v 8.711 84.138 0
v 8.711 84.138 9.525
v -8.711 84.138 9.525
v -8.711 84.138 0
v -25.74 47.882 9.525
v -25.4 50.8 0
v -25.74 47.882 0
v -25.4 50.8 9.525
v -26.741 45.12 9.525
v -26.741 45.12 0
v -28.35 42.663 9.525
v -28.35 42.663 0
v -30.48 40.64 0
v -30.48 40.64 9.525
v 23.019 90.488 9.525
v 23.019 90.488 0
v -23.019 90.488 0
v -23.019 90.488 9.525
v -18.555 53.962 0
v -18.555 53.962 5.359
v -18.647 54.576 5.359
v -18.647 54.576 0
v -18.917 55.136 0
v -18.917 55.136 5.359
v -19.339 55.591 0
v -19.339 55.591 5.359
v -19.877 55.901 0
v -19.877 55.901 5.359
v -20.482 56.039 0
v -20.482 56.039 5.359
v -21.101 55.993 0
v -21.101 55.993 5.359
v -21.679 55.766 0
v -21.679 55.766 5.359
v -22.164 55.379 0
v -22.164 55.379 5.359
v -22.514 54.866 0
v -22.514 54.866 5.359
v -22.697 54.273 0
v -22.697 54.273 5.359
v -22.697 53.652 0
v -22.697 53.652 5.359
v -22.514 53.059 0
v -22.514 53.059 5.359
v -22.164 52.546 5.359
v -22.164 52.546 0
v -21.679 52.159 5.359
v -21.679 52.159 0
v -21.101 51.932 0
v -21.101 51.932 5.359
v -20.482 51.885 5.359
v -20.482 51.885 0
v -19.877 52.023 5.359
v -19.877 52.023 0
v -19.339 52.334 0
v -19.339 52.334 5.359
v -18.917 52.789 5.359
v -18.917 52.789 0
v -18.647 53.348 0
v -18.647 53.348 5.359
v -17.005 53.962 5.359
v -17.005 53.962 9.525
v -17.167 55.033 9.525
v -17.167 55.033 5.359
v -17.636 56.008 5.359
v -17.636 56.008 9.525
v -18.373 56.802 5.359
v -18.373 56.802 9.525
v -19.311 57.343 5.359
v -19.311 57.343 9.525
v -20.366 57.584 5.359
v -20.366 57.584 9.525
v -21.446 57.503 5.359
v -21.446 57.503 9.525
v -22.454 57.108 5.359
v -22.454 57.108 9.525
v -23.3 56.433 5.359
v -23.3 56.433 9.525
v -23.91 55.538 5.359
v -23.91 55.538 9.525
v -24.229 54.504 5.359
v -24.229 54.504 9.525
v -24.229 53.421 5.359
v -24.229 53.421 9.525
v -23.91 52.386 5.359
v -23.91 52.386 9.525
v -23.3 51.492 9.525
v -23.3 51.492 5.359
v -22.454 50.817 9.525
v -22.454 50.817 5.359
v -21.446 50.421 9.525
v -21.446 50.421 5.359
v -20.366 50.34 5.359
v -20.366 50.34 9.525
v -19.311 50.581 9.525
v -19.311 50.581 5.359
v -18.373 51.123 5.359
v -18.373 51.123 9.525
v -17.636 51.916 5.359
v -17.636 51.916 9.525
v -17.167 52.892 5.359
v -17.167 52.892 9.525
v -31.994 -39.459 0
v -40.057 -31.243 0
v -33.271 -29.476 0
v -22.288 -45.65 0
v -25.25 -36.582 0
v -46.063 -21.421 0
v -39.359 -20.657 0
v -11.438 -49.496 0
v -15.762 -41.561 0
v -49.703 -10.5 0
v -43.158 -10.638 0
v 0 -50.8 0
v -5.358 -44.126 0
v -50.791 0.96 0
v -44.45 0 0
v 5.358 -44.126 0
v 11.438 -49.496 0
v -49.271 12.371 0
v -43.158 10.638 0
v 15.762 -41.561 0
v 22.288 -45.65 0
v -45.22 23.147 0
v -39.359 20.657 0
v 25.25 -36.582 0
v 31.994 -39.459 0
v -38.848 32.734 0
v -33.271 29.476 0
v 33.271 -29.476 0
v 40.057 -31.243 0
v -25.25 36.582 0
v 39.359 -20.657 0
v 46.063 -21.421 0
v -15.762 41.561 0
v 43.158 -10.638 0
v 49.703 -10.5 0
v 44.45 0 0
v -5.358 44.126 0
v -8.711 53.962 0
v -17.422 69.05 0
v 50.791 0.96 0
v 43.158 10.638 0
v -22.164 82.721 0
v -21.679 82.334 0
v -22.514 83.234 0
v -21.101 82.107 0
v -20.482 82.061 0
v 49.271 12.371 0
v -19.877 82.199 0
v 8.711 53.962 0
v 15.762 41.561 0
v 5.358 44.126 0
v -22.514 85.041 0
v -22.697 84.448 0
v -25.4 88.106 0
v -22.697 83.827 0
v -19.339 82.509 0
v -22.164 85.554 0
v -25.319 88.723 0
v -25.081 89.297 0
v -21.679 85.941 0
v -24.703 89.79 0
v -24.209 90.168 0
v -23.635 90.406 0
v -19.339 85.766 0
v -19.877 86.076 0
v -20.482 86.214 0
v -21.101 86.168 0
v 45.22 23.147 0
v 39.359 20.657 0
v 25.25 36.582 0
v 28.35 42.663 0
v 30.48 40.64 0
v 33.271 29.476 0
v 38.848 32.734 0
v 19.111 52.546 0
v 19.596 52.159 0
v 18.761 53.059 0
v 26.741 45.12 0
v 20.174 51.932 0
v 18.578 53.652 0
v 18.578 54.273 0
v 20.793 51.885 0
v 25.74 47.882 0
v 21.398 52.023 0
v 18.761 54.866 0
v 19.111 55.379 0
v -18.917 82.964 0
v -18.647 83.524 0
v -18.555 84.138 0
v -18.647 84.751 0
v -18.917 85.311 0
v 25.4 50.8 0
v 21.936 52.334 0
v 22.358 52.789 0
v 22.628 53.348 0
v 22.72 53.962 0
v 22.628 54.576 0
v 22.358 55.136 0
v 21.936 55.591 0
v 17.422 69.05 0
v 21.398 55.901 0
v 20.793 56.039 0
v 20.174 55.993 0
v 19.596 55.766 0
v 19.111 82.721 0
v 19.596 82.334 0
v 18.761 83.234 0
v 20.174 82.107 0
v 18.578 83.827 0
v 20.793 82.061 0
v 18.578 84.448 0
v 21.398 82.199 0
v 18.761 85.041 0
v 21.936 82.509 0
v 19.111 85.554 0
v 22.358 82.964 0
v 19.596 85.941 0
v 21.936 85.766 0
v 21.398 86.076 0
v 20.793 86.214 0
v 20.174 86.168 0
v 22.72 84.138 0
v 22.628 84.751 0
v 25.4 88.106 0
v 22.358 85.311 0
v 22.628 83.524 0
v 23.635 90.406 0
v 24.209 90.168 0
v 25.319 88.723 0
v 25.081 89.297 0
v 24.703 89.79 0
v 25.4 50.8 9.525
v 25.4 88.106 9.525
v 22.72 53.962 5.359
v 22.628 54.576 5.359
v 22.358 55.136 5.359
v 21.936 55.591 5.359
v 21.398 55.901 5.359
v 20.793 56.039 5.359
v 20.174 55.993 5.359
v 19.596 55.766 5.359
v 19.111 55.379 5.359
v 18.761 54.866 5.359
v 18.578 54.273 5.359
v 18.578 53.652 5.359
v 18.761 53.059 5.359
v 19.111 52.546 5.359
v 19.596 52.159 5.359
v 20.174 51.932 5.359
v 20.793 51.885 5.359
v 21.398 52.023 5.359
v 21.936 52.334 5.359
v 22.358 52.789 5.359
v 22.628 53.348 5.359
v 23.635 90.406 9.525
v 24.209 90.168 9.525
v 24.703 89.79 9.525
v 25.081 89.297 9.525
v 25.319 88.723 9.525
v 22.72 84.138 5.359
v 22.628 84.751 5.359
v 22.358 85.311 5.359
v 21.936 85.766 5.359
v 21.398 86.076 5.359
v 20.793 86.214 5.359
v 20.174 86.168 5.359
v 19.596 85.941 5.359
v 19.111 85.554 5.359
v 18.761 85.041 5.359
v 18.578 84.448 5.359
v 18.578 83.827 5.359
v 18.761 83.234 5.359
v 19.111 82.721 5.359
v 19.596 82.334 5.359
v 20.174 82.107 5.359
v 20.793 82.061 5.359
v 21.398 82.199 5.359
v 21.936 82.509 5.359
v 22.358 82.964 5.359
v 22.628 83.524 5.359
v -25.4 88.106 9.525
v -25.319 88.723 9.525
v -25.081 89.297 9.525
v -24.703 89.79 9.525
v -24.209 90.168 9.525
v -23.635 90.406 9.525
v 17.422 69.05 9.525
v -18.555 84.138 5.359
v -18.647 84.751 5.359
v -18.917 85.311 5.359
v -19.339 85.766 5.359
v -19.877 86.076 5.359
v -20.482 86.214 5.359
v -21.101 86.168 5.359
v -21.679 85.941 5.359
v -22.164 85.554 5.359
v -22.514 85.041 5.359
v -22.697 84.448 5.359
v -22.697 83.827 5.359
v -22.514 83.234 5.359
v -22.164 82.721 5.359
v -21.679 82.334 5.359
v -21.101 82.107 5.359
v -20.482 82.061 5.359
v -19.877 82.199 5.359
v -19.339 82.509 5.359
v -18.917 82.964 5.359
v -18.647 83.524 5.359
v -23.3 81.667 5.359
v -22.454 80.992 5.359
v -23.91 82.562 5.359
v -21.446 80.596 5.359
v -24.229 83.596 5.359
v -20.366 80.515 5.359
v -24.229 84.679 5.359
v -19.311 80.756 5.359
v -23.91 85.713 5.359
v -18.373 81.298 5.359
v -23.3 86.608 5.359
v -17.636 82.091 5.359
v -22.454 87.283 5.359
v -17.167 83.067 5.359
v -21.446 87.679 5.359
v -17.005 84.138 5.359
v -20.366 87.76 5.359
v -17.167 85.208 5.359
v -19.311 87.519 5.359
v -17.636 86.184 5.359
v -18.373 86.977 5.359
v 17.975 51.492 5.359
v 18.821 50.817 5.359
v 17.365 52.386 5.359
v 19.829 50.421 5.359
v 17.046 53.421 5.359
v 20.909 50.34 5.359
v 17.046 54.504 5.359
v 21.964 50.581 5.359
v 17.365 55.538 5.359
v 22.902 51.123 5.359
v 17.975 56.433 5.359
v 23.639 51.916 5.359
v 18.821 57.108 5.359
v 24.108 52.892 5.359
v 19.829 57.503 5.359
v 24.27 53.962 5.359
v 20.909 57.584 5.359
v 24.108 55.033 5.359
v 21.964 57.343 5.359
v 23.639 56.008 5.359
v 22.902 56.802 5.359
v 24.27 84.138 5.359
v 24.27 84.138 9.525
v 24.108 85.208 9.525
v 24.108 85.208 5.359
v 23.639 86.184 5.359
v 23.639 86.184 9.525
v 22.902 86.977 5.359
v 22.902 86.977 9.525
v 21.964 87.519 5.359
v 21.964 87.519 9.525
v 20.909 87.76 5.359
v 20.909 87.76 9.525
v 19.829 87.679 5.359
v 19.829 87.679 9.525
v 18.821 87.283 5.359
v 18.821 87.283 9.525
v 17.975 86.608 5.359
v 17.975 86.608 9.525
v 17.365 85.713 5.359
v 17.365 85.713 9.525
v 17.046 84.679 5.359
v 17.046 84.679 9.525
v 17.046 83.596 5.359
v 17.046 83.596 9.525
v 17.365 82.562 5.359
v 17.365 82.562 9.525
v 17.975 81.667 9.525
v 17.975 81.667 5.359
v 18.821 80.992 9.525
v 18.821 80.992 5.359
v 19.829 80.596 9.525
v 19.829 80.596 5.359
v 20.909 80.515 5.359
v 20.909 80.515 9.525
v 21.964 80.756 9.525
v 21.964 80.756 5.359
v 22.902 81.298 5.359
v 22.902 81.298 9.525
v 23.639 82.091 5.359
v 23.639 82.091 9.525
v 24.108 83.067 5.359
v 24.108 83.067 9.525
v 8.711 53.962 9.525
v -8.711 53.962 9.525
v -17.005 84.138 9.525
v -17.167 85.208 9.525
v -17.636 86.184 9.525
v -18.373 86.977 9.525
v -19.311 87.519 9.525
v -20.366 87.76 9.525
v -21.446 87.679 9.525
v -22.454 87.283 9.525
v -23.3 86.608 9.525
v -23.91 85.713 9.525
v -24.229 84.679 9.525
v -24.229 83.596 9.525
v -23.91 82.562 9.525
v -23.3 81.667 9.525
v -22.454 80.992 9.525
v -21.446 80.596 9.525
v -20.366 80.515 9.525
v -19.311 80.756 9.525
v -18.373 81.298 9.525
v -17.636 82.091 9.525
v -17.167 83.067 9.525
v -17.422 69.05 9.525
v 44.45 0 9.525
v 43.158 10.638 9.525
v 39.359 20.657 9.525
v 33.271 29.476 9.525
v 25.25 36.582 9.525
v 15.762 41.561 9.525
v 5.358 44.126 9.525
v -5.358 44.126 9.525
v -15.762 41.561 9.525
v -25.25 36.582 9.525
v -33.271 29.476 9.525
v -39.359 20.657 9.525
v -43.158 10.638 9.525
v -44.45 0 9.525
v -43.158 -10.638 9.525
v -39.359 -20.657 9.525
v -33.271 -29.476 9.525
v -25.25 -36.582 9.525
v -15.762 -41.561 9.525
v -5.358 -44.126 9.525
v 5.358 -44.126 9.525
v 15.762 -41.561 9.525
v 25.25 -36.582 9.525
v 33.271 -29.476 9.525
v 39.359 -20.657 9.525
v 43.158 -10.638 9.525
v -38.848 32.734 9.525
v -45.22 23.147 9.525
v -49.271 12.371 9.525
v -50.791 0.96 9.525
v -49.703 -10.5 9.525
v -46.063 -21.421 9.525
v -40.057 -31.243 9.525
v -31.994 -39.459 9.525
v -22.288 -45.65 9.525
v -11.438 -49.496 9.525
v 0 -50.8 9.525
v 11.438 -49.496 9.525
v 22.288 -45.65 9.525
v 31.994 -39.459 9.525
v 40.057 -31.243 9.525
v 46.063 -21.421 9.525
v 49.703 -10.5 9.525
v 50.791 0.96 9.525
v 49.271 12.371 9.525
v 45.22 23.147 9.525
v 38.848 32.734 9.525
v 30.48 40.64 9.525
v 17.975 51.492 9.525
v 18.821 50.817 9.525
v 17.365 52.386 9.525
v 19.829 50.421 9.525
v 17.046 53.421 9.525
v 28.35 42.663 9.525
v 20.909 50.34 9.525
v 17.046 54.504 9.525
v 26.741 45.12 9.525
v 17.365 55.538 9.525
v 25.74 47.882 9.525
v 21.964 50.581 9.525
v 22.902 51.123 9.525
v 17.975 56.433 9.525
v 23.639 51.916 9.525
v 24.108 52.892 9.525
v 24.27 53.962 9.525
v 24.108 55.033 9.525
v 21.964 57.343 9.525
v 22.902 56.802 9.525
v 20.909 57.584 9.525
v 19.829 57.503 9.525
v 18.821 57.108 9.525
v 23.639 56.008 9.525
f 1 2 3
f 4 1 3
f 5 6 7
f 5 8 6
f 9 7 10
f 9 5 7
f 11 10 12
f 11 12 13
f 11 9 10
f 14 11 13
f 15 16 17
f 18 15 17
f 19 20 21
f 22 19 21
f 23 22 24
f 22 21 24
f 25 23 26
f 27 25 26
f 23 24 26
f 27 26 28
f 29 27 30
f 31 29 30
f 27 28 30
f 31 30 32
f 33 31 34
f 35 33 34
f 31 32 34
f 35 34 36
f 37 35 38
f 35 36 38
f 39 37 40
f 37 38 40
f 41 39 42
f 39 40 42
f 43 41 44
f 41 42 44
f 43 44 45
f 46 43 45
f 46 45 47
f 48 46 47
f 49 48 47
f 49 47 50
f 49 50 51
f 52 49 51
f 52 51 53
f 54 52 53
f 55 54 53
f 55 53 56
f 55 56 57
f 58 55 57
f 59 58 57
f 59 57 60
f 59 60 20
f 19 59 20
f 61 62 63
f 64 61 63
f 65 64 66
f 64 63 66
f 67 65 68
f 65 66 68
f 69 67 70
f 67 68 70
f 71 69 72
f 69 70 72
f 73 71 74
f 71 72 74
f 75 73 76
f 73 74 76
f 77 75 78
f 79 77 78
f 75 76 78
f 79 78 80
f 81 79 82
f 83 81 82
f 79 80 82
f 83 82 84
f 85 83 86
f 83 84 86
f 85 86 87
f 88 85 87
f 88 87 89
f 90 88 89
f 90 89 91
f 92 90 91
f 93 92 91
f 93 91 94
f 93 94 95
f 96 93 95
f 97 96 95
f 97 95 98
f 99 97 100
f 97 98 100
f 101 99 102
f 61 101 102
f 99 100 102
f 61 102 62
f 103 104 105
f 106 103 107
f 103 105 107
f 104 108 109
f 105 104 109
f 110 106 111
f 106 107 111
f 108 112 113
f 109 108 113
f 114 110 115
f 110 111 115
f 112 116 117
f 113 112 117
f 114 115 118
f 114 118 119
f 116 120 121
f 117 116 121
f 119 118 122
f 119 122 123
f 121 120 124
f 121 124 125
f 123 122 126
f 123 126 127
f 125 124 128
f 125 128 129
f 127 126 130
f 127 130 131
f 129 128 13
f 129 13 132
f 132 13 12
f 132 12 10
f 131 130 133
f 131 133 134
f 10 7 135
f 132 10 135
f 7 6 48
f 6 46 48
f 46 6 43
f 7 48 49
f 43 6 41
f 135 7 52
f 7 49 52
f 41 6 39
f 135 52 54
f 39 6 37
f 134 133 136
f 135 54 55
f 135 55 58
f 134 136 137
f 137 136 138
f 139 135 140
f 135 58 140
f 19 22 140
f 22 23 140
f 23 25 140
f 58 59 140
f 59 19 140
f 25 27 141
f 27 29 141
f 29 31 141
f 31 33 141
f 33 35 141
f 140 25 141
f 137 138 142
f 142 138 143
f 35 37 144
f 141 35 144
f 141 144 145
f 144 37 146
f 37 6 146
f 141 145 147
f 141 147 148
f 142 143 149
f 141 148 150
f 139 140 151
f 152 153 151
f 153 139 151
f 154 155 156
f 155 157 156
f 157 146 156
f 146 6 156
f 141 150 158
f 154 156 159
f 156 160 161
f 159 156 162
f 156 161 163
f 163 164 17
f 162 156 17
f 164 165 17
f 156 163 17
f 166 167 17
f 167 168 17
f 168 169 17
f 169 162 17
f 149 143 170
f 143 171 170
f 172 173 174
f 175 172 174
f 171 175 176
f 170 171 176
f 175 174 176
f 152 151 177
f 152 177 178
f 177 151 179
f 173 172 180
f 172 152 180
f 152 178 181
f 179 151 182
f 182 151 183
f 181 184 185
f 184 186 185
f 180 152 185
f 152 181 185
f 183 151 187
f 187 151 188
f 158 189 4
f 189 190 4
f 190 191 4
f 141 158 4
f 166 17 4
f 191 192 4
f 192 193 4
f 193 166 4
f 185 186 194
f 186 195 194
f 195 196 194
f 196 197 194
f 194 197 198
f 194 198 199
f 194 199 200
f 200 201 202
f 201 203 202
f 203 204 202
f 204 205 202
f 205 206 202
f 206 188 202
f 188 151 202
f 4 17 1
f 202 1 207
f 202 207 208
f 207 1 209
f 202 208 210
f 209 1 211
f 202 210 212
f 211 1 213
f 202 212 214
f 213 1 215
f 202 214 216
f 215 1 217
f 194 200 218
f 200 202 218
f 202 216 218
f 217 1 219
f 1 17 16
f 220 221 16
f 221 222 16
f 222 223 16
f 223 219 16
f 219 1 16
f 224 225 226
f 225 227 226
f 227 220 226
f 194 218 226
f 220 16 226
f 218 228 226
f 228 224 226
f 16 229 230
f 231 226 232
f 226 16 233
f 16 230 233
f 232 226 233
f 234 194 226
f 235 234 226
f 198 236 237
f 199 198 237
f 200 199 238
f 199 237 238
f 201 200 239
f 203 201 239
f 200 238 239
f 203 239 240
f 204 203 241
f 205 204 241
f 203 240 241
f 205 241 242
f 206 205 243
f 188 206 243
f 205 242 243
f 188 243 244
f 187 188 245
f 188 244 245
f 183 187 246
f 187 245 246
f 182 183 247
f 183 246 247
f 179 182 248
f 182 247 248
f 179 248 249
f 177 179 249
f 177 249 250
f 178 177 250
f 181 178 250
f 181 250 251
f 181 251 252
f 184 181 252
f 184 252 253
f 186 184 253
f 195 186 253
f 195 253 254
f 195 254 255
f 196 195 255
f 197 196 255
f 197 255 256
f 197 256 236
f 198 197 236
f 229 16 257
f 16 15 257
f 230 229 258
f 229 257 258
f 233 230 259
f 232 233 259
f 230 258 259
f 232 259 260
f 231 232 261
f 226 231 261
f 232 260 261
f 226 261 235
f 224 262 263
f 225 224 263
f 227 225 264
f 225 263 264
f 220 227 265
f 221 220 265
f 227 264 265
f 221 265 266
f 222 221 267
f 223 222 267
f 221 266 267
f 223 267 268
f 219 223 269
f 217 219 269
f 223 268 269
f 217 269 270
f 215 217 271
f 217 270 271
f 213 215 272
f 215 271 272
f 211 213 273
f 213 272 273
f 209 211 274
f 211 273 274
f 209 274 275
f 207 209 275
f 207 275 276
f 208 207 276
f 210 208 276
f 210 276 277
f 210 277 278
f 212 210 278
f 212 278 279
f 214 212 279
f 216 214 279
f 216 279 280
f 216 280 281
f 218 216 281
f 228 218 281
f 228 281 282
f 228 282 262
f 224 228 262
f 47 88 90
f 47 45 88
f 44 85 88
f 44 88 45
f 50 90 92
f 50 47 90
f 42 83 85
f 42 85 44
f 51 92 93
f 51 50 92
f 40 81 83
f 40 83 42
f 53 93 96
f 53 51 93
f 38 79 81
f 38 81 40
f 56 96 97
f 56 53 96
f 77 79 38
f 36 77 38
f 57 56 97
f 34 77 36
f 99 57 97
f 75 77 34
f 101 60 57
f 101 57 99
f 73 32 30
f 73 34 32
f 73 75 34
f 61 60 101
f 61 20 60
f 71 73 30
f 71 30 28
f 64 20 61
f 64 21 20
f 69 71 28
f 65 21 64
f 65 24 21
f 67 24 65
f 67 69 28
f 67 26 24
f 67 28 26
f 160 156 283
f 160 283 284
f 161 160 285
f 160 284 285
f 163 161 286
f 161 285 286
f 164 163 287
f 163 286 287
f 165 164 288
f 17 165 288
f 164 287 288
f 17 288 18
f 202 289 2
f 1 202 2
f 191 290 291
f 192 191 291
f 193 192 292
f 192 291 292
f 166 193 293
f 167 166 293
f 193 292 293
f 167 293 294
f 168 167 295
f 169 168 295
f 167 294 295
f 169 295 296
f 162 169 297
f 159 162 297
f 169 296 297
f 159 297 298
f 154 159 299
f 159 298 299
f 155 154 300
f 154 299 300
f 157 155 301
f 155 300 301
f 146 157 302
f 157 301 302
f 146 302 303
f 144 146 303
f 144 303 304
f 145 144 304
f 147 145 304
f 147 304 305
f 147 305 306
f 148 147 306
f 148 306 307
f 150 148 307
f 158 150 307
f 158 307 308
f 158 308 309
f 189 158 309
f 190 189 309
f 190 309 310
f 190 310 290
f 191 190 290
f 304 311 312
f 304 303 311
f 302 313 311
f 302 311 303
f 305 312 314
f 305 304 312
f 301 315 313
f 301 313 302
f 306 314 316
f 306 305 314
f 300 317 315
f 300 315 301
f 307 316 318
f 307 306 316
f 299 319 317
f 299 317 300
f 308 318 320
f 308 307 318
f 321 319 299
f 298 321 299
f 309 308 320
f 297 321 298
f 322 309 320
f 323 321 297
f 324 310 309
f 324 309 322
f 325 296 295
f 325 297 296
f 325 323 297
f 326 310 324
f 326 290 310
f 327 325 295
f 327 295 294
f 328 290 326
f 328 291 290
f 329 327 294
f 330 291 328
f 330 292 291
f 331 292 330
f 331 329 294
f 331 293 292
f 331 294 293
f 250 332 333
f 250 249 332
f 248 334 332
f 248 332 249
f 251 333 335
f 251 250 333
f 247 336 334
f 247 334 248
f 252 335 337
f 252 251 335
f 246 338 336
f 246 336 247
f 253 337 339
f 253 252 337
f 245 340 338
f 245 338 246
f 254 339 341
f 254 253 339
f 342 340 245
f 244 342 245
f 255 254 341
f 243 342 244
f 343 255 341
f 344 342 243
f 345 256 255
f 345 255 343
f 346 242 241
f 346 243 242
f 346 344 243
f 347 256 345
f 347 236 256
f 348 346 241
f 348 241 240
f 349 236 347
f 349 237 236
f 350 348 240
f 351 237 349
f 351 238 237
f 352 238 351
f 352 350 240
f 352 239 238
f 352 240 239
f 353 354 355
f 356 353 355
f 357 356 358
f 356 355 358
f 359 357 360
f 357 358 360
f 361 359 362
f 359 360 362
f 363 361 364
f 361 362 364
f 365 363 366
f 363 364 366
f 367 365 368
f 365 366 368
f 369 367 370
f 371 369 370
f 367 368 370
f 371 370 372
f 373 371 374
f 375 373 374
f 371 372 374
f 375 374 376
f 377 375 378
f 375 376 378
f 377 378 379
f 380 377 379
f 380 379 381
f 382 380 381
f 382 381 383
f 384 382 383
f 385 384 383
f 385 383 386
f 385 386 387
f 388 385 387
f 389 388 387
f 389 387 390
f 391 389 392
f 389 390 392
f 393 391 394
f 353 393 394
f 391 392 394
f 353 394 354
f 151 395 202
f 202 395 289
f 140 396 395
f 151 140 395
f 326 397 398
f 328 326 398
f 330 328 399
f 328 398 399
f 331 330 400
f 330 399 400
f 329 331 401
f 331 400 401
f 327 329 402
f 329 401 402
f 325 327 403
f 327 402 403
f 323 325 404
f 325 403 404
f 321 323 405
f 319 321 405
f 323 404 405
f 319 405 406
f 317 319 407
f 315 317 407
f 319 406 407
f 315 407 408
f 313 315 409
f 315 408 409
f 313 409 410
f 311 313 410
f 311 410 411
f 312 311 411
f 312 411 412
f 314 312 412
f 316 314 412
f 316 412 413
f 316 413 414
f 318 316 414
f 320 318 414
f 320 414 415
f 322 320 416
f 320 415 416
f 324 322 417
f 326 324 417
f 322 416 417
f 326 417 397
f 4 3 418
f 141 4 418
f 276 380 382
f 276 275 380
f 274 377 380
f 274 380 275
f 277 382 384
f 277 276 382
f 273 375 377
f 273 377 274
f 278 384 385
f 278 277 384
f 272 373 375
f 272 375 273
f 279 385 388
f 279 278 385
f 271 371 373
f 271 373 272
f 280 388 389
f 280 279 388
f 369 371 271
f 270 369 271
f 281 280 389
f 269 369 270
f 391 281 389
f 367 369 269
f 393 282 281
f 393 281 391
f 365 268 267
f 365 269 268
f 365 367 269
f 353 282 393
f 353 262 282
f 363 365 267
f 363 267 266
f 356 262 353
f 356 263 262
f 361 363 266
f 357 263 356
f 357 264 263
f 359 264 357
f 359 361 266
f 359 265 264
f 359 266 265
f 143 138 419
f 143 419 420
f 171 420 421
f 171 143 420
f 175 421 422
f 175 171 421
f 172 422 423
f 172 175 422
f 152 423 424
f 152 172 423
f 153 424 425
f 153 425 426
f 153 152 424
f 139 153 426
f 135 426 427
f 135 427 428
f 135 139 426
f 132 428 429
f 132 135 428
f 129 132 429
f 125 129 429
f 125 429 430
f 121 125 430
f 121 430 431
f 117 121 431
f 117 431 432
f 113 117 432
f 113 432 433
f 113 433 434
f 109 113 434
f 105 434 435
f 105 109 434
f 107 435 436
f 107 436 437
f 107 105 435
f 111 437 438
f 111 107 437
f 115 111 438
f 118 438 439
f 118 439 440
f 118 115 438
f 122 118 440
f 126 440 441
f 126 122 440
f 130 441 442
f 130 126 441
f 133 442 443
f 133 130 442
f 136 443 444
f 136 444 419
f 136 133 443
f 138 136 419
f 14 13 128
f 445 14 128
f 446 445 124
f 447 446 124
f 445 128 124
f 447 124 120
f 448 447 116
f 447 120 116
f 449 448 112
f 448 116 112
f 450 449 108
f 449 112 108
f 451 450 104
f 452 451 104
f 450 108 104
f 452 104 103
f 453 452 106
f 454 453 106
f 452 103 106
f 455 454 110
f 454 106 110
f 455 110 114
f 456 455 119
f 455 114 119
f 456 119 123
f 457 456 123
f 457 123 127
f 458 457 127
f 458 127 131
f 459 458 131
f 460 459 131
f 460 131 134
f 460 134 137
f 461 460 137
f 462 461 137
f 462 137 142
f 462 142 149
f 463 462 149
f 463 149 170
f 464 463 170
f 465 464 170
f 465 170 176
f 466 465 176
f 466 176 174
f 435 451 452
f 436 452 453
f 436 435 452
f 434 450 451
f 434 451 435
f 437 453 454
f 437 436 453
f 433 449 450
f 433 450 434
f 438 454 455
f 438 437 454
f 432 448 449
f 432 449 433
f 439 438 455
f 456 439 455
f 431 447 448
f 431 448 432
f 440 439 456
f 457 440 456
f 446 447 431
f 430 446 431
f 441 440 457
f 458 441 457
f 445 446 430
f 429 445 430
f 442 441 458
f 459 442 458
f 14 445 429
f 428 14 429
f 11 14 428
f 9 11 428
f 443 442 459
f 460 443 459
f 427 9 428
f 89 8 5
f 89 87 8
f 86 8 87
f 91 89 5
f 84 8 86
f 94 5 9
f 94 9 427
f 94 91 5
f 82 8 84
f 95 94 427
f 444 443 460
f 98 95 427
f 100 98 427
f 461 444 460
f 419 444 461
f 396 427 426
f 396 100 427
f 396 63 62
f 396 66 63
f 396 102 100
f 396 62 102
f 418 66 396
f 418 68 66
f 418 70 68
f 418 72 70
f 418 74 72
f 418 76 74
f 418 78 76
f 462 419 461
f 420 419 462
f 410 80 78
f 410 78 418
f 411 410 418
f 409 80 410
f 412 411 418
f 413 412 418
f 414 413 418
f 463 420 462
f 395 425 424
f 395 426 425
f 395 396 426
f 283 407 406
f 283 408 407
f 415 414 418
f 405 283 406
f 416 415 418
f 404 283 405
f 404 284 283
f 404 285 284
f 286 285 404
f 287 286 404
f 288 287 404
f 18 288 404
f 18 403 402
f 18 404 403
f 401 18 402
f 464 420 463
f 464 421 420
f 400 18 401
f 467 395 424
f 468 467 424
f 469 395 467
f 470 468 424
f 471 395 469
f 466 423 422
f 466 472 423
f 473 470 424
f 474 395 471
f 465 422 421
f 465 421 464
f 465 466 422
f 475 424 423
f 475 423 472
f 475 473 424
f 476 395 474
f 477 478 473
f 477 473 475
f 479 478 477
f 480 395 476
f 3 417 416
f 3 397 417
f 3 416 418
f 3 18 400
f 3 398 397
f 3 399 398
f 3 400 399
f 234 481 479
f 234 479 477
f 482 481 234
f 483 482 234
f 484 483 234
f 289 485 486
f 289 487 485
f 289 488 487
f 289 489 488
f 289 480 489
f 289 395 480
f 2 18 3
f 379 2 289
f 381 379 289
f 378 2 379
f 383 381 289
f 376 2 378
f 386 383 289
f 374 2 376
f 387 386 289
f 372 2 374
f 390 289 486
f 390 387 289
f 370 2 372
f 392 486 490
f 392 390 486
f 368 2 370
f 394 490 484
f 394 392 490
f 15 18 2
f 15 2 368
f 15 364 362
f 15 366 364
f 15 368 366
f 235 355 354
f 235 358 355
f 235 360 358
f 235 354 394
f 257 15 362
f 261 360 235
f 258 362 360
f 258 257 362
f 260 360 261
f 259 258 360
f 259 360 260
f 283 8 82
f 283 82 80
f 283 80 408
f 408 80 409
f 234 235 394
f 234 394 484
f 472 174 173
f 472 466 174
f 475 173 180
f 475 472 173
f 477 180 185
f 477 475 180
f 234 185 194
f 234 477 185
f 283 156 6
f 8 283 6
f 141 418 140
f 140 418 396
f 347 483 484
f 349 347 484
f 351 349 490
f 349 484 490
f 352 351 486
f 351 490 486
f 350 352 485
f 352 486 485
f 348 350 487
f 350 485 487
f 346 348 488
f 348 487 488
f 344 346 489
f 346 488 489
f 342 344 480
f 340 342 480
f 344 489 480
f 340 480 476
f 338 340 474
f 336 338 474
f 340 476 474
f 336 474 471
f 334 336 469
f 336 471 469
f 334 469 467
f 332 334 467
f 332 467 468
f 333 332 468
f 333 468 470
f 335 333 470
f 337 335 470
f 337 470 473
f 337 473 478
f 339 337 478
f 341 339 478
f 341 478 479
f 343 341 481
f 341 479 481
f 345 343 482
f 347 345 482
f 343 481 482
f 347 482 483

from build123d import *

# Parameters (mm, degrees)
F0_R     = 44.45
F1_DEPTH = 9.525
F2_R     = 2.0828
F3_DEPTH = 25.4
F4_R     = 3.6322
F5_DEPTH = 4.1656
F6_R     = 2.38125
F7_R     = 12.7


with BuildPart() as f1:
    # F0 (on Top) → F1 (new body)
    with BuildSketch(Plane.XY):
        with BuildLine():
            Line((-25.4, 90.4875), (-25.4, 43.994091))
            ThreePointArc((-25.4, 43.994091), (0, -50.8), (25.4, 43.994091))
            Line((25.4, 43.994091), (25.4, 90.4875))
            Line((25.4, 90.4875), (-25.4, 90.4875))
        make_face()
        Circle(F0_R, mode=Mode.SUBTRACT)
    extrude(amount=F1_DEPTH)

    # F2 (on face) → F3 (cut)
    with BuildSketch(Plane.XY.offset(9.525)):
        with Locations((-20.6375, 84.1375)):
            Circle(F2_R)
        with Locations((20.6375, 84.1375)):
            Circle(F2_R)
        with Locations((20.6375, 53.9623)):
            Circle(F2_R)
        with Locations((-20.6375, 53.9623)):
            Circle(F2_R)
        Polygon((-17.42166, 69.0499), (-8.71083, 53.9623), (8.71083, 53.9623), (17.42166, 69.0499), (8.71083, 84.1375), (-8.71083, 84.1375), align=None)
    extrude(amount=-F3_DEPTH, mode=Mode.SUBTRACT)

    # F4 (on face) → F5 (cut)
    with BuildSketch(Plane.XY.offset(9.525)):
        with Locations((-20.6375, 84.1375)):
            Circle(F4_R)
        with Locations((20.6375, 84.1375)):
            Circle(F4_R)
        with Locations((20.6375, 53.9623)):
            Circle(F4_R)
        with Locations((-20.6375, 53.9623)):
            Circle(F4_R)
    extrude(amount=-F5_DEPTH, mode=Mode.SUBTRACT)

    # F6
    f6_edges = [f1.edges().sort_by_distance(p)[0] for p in [
        (-25.4, 90.4875, 4.7625),
        (25.4, 90.4875, 4.7625),
    ]]
    fillet(f6_edges, radius=F6_R)

    # F7
    f7_edges = [f1.edges().sort_by_distance(p)[0] for p in [
        (-25.4, 43.994091, 4.7625),
        (25.4, 43.994091, 4.7625),
    ]]
    fillet(f7_edges, radius=F7_R)


solid = f1.part
